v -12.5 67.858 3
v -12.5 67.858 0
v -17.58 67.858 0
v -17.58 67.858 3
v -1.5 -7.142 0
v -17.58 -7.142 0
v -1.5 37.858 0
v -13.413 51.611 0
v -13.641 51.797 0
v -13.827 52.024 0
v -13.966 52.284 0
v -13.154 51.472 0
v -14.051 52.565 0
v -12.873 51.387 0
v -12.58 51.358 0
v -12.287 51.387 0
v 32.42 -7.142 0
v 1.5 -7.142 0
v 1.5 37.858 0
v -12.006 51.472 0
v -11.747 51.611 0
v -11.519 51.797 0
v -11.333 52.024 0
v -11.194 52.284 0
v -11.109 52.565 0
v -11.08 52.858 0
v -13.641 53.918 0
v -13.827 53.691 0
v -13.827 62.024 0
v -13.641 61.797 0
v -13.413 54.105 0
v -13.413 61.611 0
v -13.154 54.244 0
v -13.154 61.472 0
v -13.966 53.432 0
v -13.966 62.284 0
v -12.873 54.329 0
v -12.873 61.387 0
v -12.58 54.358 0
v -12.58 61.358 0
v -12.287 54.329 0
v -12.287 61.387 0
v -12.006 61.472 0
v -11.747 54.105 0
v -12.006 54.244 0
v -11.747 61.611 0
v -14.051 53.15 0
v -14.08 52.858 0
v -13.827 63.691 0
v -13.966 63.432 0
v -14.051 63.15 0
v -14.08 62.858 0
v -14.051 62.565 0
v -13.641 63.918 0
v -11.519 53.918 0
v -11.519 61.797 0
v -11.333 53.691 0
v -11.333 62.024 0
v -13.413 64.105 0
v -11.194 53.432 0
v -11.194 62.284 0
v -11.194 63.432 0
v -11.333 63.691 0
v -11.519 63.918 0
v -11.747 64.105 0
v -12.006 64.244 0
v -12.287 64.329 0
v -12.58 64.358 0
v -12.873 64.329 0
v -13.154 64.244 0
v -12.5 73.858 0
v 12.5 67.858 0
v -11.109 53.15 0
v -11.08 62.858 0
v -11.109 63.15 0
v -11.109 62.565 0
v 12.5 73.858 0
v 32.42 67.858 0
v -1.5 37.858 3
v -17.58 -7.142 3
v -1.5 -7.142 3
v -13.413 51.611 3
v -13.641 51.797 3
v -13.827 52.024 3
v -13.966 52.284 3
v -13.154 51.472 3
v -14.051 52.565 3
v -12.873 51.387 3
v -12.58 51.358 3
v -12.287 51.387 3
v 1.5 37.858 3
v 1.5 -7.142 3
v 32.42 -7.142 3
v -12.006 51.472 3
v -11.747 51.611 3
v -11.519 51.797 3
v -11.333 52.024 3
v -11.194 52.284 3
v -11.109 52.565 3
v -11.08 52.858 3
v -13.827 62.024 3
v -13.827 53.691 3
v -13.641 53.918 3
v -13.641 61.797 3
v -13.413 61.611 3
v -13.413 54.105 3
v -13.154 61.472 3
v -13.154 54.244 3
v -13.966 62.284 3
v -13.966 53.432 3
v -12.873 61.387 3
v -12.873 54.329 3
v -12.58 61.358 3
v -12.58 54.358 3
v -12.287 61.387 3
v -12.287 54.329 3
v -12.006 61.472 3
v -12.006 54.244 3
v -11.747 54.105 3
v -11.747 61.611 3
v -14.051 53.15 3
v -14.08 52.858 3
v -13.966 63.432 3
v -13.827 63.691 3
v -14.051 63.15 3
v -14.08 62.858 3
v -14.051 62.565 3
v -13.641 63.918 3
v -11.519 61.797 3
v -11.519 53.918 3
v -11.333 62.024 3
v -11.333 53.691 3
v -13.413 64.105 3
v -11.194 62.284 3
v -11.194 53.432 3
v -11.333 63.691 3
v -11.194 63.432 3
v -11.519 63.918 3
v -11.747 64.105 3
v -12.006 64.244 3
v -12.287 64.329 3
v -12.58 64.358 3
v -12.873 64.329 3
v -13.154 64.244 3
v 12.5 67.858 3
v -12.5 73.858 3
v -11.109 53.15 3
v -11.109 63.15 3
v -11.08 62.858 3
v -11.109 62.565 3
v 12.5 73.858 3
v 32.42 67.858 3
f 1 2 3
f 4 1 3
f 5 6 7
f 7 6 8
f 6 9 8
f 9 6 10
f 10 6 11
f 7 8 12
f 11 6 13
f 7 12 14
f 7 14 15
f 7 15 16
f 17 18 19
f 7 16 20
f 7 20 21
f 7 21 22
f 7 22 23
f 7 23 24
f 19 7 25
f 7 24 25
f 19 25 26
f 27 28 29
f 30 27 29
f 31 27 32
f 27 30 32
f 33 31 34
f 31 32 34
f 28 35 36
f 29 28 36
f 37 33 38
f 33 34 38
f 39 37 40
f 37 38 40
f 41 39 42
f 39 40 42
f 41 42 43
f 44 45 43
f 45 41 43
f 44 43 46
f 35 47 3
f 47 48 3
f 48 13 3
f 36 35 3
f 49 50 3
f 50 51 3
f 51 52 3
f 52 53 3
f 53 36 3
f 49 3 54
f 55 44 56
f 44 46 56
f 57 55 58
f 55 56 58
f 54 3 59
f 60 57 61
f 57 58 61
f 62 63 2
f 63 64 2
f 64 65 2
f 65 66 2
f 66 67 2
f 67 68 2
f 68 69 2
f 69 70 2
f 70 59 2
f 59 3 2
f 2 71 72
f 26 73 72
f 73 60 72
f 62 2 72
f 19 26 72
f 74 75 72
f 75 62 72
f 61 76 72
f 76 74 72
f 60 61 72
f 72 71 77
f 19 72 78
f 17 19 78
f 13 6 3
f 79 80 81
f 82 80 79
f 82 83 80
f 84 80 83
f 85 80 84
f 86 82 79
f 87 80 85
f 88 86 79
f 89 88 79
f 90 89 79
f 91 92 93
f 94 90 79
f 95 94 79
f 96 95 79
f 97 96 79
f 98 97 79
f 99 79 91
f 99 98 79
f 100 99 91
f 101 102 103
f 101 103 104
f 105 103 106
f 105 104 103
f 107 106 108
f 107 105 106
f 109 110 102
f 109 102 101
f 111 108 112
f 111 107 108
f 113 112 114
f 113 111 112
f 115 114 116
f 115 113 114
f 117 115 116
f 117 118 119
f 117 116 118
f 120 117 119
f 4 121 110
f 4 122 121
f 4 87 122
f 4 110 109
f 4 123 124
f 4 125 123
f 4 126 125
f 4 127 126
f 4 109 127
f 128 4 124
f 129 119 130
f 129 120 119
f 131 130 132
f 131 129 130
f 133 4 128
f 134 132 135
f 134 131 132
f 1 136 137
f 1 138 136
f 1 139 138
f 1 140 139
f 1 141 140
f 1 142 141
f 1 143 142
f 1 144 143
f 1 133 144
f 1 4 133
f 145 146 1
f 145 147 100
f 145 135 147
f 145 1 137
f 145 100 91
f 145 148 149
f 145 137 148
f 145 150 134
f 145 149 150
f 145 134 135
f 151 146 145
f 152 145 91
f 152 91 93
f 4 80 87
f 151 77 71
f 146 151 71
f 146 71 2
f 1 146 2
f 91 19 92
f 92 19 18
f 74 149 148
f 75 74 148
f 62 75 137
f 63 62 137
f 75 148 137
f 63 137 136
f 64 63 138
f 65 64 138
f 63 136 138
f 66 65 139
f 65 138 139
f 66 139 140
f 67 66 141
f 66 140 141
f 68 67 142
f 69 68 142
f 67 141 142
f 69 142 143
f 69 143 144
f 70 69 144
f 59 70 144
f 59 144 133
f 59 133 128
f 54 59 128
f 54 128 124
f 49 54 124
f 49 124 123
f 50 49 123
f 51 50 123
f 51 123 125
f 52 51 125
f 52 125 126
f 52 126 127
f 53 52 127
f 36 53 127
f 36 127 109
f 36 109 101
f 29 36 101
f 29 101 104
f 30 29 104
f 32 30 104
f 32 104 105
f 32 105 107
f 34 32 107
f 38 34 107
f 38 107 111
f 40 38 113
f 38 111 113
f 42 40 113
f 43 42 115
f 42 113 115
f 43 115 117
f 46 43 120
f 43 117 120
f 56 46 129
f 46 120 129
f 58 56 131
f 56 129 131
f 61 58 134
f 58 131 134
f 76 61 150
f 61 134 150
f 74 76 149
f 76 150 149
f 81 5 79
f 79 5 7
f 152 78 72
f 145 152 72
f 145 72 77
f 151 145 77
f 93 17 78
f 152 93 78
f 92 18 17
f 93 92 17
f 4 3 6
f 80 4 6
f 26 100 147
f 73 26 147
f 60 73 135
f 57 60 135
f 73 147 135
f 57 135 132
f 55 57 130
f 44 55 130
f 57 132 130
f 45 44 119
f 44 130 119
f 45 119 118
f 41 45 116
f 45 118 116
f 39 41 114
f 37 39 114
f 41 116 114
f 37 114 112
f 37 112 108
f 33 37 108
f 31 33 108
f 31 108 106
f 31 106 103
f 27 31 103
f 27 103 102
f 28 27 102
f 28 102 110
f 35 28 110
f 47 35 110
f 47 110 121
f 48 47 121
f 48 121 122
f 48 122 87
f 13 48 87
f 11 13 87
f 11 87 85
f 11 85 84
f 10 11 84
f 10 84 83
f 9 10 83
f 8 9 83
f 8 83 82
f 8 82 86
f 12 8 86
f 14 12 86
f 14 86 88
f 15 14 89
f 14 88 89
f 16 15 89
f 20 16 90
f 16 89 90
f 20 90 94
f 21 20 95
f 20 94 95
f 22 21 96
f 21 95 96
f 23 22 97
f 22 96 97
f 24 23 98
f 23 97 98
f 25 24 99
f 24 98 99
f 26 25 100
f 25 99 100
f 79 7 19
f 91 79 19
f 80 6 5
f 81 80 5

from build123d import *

# Parameters (mm, degrees)
BOSS_EXTRUDE1_DEPTH = 3
SKETCH2_R           = 1.5
CUT_EXTRUDE1_DEPTH  = 4


with BuildPart() as part:
    # Sketch1 → Boss-Extrude1 (new body)
    with BuildSketch(Plane.XY):
        Polygon((12.5, 73.857731997), (-12.5, 73.857731997), (-12.5, 67.857731997), (-17.58, 67.857731997), (-17.58, -7.142268003), (-1.5, -7.142268003), (-1.5, 37.857731997), (1.5, 37.857731997), (1.5, -7.142268003), (32.42, -7.142268003), (32.42, 67.857731997), (12.5, 67.857731997), align=None)
    extrude(amount=BOSS_EXTRUDE1_DEPTH)

    # Sketch2 → Cut-Extrude1 (cut, through all)
    with BuildSketch(Plane.XY.offset(3)):
        with Locations((-12.58, 62.857731997)):
            Circle(SKETCH2_R)
        with Locations((-12.58, 52.857731997)):
            Circle(SKETCH2_R)
    extrude(amount=-CUT_EXTRUDE1_DEPTH, mode=Mode.SUBTRACT)


solid = part.part
